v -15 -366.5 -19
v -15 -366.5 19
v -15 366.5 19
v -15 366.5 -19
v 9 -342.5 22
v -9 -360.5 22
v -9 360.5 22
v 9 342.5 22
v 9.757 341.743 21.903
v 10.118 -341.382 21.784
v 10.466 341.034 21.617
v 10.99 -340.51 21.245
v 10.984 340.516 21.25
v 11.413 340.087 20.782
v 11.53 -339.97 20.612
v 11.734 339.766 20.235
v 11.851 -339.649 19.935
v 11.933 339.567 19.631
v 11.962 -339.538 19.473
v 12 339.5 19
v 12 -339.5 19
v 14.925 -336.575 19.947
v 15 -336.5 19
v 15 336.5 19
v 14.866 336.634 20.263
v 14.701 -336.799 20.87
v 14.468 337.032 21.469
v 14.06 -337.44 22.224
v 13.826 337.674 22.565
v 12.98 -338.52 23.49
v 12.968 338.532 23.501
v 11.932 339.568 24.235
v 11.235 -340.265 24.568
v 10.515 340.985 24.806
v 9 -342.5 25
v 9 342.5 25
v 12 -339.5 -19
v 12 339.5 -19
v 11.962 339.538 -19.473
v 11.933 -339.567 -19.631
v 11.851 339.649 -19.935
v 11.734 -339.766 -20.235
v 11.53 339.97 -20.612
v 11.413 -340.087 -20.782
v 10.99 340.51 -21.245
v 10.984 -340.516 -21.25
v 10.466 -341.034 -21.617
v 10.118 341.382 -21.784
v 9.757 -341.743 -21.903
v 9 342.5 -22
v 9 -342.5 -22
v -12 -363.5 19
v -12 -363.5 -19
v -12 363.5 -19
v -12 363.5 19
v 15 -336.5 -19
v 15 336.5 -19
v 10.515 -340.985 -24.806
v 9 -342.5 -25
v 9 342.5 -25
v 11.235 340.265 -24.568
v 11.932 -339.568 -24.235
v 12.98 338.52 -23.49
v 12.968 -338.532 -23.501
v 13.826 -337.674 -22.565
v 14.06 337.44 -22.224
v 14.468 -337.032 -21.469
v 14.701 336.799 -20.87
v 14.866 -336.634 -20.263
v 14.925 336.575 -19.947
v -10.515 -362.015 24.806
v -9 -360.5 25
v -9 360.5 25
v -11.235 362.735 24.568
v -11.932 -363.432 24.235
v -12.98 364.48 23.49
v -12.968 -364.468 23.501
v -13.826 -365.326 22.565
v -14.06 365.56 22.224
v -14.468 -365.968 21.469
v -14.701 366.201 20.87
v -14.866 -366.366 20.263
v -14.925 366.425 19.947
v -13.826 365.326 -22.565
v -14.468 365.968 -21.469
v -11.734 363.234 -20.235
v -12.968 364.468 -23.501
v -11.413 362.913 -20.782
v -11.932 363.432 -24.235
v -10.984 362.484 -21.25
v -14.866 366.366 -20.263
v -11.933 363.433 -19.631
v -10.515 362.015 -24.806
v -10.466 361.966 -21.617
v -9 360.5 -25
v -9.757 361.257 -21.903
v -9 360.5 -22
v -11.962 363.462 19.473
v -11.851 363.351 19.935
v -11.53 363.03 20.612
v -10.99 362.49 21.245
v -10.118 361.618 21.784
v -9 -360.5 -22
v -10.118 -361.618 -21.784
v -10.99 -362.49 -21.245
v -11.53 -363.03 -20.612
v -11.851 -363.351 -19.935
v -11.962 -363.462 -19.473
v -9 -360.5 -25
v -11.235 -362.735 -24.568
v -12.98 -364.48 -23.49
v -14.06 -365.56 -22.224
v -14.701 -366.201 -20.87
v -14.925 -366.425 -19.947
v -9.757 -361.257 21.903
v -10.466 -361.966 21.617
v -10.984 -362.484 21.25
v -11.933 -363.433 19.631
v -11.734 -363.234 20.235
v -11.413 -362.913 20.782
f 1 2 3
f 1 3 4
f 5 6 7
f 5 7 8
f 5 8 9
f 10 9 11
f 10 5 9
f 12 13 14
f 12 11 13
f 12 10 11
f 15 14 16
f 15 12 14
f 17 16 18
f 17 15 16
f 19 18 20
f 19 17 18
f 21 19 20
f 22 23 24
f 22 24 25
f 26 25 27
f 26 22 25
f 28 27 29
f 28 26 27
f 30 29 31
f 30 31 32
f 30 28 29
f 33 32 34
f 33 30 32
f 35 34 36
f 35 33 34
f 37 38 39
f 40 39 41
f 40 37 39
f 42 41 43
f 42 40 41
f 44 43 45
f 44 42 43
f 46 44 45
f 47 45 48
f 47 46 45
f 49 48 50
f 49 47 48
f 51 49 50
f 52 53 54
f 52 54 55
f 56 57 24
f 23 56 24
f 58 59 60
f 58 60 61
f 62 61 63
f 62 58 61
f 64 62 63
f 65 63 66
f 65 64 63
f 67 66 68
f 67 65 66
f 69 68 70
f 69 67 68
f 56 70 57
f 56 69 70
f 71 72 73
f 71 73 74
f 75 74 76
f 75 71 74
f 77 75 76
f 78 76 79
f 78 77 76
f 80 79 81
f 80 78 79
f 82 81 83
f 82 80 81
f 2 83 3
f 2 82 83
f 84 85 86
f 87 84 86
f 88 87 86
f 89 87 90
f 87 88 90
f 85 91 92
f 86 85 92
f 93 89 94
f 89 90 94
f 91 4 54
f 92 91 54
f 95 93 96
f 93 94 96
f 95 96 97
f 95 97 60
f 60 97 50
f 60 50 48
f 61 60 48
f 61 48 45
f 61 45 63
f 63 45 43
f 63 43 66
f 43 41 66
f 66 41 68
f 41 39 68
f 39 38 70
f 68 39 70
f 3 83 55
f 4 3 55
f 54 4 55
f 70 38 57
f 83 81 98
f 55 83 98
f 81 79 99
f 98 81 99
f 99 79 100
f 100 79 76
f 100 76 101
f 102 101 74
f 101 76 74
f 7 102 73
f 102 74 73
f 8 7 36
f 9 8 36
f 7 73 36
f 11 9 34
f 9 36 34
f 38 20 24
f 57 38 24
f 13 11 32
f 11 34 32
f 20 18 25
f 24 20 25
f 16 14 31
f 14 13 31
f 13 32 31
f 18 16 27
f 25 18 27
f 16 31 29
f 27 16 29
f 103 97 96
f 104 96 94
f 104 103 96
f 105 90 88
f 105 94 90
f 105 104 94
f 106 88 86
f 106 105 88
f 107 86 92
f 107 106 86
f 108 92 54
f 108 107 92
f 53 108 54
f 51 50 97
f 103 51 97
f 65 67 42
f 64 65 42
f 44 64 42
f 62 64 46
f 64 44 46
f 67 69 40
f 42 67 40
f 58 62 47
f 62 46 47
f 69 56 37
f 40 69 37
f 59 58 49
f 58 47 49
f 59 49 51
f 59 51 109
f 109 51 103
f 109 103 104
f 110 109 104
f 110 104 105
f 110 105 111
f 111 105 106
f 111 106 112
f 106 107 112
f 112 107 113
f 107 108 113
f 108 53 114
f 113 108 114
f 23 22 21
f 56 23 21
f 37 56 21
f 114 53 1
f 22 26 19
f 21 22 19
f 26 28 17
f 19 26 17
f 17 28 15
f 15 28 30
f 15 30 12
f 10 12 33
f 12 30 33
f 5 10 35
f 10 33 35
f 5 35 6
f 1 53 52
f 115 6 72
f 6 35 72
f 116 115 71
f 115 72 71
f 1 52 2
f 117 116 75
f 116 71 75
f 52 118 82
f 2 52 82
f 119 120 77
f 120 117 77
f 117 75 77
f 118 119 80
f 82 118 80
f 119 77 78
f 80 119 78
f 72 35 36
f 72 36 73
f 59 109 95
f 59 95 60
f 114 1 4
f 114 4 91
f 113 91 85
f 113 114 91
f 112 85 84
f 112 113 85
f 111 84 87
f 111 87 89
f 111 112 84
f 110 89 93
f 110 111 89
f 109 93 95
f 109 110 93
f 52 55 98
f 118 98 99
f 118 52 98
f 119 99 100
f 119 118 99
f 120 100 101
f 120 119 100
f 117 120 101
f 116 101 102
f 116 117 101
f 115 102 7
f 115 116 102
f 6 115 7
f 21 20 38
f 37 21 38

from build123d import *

# Parameters (mm, degrees)
F1_DEPTH = 366.5
F3_DEPTH = 50


with BuildPart() as f1:
    # F0 (on Front) → F1 (new body, symmetric)
    with BuildSketch(Plane.XZ):
        with BuildLine():
            ThreePointArc((15, 19), (13.2426406871, 23.2426406871), (9, 25))
            Line((9, 25), (-9, 25))
            ThreePointArc((-9, 25), (-13.2426406871, 23.2426406871), (-15, 19))
            Line((-15, 19), (-15, -19))
            ThreePointArc((-15, -19), (-13.2426406871, -23.2426406871), (-9, -25))
            Line((-9, -25), (9, -25))
            ThreePointArc((9, -25), (13.2426406871, -23.2426406871), (15, -19))
            Line((15, -19), (15, 19))
        make_face()
        with BuildLine():
            Line((-9, 22), (9, 22))
            ThreePointArc((9, 22), (11.1213203436, 21.1213203436), (12, 19))
            Line((12, 19), (12, -19))
            ThreePointArc((12, -19), (11.1213203436, -21.1213203436), (9, -22))
            Line((9, -22), (-9, -22))
            ThreePointArc((-9, -22), (-11.1213203436, -21.1213203436), (-12, -19))
            Line((-12, -19), (-12, 19))
            ThreePointArc((-12, 19), (-11.1213203436, 21.1213203436), (-9, 22))
        make_face(mode=Mode.SUBTRACT)
    extrude(amount=F1_DEPTH, both=True)

    # F2 (on face) → F3 (cut, through all)
    with BuildSketch(Plane.XY.offset(25)):
        Polygon((-9, -366.5), (-9, -360.5), (-15, -366.5), align=None)
        Polygon((9, -366.5), (9, -342.5), (-9, -360.5), (-9, -366.5), align=None)
        Polygon((15, -336.5), (9, -342.5), (9, -366.5), (15, -366.5), align=None)
        Polygon((-15, 366.5), (-9, 360.5), (-9, 366.5), align=None)
        Polygon((-9, 360.5), (9, 342.5), (9, 366.5), (-9, 366.5), align=None)
        Polygon((9, 342.5), (15, 336.5), (15, 366.5), (9, 366.5), align=None)
    extrude(amount=-F3_DEPTH, mode=Mode.SUBTRACT)


solid = f1.part
